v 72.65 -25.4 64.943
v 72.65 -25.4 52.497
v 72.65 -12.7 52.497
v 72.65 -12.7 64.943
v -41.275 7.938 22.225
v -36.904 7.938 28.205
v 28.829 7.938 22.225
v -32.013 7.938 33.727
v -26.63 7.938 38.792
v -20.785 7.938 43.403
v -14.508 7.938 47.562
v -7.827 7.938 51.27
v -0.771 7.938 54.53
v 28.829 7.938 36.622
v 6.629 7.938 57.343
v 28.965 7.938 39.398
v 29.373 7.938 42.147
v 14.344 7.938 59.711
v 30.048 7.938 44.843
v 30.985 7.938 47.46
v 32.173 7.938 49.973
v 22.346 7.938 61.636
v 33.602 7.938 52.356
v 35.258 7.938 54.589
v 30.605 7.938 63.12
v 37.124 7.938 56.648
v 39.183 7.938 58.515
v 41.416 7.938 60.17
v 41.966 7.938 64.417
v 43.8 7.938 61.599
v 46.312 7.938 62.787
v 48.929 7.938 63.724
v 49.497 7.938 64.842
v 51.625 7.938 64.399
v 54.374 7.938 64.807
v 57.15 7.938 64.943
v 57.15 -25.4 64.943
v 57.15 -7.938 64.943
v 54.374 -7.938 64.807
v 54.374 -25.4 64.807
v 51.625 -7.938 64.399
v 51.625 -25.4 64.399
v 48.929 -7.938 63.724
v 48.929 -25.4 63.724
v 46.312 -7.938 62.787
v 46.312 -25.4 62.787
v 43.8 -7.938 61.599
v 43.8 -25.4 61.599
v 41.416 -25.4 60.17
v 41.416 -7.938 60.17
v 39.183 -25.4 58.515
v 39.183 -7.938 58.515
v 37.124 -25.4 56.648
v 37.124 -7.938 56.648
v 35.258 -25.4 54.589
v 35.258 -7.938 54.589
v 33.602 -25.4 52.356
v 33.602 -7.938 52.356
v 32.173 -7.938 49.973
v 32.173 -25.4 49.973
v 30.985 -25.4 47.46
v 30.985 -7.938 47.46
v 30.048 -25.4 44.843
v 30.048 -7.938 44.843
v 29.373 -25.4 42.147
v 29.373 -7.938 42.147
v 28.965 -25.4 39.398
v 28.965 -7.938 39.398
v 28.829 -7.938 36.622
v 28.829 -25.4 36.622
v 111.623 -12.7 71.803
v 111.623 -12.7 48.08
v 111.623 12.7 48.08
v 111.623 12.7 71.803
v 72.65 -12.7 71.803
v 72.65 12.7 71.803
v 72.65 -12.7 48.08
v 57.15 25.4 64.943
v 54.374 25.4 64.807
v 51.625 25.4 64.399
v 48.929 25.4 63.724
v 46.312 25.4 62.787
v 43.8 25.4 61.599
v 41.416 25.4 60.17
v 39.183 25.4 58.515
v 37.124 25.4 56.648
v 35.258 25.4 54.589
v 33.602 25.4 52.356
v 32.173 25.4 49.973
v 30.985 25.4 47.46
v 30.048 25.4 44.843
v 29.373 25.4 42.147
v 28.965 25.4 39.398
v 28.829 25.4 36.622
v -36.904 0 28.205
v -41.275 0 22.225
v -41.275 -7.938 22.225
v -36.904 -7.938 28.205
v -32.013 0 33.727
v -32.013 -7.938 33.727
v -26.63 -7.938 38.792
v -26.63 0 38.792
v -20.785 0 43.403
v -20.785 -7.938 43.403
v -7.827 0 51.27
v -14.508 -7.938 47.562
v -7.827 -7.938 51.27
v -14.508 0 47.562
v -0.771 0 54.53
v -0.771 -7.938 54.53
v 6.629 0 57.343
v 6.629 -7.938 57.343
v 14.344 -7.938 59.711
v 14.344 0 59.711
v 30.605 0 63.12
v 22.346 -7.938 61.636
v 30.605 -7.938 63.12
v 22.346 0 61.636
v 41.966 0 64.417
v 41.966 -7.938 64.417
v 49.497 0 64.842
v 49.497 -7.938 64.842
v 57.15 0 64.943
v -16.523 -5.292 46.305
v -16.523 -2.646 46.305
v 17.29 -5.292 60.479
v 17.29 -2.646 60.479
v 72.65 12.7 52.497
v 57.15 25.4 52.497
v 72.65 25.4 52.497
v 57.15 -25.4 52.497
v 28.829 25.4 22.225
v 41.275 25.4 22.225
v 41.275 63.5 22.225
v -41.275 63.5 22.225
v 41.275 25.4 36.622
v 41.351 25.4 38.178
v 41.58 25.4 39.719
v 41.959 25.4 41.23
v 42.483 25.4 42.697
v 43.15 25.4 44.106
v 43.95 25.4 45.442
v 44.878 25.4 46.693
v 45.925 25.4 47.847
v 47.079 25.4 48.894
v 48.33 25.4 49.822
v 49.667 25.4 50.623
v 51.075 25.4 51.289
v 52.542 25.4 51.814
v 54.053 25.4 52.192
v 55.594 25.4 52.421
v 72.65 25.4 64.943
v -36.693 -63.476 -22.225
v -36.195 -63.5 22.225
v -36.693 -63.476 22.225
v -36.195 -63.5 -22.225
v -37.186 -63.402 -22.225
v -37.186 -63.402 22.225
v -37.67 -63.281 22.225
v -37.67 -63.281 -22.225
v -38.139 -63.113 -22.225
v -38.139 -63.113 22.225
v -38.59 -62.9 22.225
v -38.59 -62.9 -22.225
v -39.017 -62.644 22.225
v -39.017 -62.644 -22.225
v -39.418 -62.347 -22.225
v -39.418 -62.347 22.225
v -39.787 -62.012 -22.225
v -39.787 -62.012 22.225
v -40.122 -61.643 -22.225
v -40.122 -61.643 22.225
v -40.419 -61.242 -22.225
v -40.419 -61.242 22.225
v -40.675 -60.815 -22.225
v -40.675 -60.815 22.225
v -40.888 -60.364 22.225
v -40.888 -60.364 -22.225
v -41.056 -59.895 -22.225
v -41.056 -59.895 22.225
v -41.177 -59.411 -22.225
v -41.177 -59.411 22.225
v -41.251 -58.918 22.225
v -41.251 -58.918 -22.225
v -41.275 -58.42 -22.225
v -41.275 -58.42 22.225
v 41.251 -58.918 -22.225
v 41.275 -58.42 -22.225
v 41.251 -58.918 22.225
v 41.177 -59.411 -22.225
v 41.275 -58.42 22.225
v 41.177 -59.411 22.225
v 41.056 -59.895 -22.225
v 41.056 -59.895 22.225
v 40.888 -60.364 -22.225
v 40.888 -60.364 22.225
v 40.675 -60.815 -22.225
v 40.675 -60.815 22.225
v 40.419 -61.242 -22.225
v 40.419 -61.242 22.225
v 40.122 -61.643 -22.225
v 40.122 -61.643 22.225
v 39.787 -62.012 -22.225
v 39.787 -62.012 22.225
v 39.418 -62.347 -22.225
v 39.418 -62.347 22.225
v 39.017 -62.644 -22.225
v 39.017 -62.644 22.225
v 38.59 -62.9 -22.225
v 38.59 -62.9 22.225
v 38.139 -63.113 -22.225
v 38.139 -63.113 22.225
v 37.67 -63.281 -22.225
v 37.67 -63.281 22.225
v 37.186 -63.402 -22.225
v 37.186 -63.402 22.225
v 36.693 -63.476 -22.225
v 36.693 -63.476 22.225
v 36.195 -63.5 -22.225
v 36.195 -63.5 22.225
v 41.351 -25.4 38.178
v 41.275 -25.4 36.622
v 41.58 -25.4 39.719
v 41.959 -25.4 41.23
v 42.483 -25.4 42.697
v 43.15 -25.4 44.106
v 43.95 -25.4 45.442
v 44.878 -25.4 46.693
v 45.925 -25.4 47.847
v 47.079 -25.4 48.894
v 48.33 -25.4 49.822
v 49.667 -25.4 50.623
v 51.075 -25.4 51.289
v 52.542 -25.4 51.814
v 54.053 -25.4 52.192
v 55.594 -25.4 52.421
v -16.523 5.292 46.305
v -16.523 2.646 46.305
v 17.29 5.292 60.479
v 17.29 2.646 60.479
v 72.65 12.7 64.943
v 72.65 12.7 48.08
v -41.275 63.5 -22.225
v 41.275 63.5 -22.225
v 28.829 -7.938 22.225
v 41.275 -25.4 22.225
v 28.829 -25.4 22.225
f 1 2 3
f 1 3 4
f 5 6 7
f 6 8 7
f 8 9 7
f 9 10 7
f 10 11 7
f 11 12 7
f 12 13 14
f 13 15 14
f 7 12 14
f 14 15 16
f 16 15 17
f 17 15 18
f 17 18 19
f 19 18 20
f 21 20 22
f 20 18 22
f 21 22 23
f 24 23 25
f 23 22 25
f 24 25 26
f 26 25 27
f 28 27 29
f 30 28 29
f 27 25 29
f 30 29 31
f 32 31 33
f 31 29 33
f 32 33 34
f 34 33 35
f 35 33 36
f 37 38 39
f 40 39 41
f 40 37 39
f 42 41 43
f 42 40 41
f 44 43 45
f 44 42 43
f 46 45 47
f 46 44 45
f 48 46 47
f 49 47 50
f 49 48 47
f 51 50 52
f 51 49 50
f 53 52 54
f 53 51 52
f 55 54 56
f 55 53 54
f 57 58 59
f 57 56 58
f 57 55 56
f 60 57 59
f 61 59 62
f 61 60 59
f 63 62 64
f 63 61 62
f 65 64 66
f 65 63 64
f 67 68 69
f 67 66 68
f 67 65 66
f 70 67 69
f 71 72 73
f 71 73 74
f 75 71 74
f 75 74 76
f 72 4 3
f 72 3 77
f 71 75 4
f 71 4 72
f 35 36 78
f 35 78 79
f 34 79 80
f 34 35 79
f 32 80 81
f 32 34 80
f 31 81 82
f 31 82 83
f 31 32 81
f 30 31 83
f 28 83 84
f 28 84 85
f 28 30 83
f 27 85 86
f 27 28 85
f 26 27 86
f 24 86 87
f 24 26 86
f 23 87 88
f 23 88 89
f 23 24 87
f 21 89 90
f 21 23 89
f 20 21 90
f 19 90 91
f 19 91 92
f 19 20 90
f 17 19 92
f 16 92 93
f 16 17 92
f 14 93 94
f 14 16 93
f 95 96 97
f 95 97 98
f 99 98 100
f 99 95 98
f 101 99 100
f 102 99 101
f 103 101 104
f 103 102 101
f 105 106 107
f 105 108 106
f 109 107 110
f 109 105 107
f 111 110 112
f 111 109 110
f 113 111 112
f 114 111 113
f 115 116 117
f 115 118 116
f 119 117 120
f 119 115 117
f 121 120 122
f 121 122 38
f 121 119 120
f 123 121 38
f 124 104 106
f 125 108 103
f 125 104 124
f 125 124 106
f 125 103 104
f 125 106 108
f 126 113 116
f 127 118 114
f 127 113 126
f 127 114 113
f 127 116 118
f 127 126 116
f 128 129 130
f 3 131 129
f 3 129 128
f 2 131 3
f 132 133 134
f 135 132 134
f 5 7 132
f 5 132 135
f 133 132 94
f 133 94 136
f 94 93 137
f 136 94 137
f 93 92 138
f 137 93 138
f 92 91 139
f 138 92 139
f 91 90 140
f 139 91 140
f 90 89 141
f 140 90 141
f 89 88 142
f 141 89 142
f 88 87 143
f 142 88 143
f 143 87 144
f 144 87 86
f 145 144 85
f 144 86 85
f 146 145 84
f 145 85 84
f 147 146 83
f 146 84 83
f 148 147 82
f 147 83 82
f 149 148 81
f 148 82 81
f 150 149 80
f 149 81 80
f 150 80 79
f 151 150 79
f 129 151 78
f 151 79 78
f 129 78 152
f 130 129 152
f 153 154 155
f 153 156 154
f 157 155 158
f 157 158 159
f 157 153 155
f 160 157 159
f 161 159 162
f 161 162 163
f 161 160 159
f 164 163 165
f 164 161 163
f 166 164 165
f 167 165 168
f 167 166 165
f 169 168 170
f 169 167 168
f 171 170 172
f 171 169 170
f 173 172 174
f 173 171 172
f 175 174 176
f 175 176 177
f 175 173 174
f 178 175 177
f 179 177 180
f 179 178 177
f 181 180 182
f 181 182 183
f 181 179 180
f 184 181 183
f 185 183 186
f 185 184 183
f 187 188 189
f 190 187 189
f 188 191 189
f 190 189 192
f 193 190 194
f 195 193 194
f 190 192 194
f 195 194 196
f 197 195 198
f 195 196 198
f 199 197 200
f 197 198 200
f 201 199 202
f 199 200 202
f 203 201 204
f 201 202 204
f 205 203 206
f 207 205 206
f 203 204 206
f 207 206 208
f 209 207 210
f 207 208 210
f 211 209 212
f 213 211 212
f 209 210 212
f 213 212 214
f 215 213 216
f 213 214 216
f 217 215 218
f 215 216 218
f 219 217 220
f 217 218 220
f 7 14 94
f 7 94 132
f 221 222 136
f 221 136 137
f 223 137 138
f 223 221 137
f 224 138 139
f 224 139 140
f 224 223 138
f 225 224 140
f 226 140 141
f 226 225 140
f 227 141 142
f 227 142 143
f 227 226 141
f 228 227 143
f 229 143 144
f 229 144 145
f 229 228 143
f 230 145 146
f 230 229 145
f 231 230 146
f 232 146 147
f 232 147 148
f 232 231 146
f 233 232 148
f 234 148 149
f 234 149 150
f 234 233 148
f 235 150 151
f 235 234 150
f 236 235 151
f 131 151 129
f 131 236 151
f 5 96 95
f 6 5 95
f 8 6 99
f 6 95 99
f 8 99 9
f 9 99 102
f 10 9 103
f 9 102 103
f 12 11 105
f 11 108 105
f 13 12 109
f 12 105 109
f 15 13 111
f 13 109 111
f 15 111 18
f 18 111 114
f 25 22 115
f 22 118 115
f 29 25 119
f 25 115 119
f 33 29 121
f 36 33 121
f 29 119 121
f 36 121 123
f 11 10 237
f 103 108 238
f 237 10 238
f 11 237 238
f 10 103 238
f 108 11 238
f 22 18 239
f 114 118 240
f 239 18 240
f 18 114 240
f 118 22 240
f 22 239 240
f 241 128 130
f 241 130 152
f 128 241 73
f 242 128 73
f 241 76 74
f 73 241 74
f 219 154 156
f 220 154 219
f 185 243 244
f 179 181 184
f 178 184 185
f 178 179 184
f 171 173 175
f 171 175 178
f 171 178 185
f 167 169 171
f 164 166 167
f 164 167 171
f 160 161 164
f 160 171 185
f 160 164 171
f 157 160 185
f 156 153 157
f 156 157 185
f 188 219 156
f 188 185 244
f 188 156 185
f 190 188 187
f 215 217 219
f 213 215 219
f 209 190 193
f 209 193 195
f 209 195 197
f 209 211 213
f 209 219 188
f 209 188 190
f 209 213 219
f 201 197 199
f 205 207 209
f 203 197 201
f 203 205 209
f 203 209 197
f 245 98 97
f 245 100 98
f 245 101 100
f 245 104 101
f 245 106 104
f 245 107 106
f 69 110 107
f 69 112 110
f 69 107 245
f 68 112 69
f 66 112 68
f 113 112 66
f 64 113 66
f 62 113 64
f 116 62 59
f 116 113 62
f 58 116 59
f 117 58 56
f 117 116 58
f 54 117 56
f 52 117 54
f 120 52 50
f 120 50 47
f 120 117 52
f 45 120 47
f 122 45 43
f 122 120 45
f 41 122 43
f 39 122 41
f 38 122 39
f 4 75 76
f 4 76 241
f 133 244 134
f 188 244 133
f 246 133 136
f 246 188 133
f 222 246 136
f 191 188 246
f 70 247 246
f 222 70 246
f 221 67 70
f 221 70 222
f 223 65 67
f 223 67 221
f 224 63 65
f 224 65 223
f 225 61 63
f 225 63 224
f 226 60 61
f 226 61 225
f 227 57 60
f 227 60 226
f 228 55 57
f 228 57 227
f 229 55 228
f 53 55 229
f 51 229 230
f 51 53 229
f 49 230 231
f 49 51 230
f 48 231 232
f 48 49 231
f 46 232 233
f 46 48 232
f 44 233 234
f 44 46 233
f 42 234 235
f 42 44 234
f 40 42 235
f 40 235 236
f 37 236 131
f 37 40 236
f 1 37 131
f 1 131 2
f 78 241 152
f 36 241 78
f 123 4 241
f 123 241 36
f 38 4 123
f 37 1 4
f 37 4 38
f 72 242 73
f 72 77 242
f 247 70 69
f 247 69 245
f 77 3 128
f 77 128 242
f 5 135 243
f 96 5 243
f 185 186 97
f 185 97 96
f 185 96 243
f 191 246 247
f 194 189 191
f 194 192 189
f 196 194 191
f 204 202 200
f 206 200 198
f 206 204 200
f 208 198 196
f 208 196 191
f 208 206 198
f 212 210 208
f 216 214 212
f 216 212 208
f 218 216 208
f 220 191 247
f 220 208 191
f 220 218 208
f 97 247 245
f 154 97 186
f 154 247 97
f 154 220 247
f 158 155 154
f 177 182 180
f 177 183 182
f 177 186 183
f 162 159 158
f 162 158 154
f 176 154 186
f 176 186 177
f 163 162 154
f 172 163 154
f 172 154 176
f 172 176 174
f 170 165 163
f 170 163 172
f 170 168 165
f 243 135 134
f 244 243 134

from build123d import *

# Parameters (mm, degrees)
F1_DEPTH = 63.5
F2_DEPTH = 25.4
F3_DEPTH = 7.9375
F4_R     = 5.08
F5_DEPTH = 12.7


with BuildPart() as f1:
    # F0 (on Front) → F1 (new body, symmetric)
    with BuildSketch(Plane.XZ):
        Polygon((41.275, -22.225), (41.275, 22.225), (28.829001, 22.225), (-41.275, 22.225), (-41.275, -22.225), align=None)
    extrude(amount=F1_DEPTH, both=True)

    # F0 (on Front) → F2 (join, symmetric)
    with BuildSketch(Plane.XZ):
        with BuildLine():
            Line((28.829001, 22.225), (41.275, 22.225))
            Line((41.275, 22.225), (41.275, 36.622151))
            ThreePointArc((41.275, 36.622151), (45.92468, 47.847471), (57.15, 52.497151))
            Line((57.15, 52.497151), (72.650053, 52.497151))
            Line((72.650053, 52.497151), (72.650053, 64.94315))
            Line((72.650053, 64.94315), (57.15, 64.94315))
            ThreePointArc((57.15, 64.94315), (37.124029, 56.648122), (28.829001, 36.622151))
            Line((28.829001, 36.622151), (28.829001, 22.225))
        make_face()
    extrude(amount=F2_DEPTH, both=True)

    # F0 (on Front) → F3 (join, symmetric)
    with BuildSketch(Plane.XZ):
        with BuildLine():
            Line((-41.275, 22.225), (28.829001, 22.225))
            Line((28.829001, 22.225), (28.829001, 36.622151))
            ThreePointArc((28.829001, 36.622151), (37.124029, 56.648122), (57.15, 64.94315))
            add(Edge.make_bspline(
                [(-41.275, 22.225), (-22.058656, 51.323876), (15.271166, 65.268377), (57.15, 64.94315)],
                knots=[0, 0, 0, 0, 107.295484, 107.295484, 107.295484, 107.295484], degree=3))
        make_face()
    extrude(amount=F3_DEPTH, both=True)

    # F4
    f4_edges = [f1.edges().sort_by_distance(p)[0] for p in [
        (41.275, -63.5, 0),
        (-41.275, -63.5, 0),
    ]]
    fillet(f4_edges, radius=F4_R)

    # F0 (on Front) → F5 (join, symmetric)
    with BuildSketch(Plane.XZ):
        Polygon((72.650053, 64.94315), (72.650053, 52.497151), (72.650053, 48.080355), (111.622654, 48.080355), (111.622654, 71.80281), (72.650053, 71.80281), align=None)
    extrude(amount=F5_DEPTH, both=True)


solid = f1.part
